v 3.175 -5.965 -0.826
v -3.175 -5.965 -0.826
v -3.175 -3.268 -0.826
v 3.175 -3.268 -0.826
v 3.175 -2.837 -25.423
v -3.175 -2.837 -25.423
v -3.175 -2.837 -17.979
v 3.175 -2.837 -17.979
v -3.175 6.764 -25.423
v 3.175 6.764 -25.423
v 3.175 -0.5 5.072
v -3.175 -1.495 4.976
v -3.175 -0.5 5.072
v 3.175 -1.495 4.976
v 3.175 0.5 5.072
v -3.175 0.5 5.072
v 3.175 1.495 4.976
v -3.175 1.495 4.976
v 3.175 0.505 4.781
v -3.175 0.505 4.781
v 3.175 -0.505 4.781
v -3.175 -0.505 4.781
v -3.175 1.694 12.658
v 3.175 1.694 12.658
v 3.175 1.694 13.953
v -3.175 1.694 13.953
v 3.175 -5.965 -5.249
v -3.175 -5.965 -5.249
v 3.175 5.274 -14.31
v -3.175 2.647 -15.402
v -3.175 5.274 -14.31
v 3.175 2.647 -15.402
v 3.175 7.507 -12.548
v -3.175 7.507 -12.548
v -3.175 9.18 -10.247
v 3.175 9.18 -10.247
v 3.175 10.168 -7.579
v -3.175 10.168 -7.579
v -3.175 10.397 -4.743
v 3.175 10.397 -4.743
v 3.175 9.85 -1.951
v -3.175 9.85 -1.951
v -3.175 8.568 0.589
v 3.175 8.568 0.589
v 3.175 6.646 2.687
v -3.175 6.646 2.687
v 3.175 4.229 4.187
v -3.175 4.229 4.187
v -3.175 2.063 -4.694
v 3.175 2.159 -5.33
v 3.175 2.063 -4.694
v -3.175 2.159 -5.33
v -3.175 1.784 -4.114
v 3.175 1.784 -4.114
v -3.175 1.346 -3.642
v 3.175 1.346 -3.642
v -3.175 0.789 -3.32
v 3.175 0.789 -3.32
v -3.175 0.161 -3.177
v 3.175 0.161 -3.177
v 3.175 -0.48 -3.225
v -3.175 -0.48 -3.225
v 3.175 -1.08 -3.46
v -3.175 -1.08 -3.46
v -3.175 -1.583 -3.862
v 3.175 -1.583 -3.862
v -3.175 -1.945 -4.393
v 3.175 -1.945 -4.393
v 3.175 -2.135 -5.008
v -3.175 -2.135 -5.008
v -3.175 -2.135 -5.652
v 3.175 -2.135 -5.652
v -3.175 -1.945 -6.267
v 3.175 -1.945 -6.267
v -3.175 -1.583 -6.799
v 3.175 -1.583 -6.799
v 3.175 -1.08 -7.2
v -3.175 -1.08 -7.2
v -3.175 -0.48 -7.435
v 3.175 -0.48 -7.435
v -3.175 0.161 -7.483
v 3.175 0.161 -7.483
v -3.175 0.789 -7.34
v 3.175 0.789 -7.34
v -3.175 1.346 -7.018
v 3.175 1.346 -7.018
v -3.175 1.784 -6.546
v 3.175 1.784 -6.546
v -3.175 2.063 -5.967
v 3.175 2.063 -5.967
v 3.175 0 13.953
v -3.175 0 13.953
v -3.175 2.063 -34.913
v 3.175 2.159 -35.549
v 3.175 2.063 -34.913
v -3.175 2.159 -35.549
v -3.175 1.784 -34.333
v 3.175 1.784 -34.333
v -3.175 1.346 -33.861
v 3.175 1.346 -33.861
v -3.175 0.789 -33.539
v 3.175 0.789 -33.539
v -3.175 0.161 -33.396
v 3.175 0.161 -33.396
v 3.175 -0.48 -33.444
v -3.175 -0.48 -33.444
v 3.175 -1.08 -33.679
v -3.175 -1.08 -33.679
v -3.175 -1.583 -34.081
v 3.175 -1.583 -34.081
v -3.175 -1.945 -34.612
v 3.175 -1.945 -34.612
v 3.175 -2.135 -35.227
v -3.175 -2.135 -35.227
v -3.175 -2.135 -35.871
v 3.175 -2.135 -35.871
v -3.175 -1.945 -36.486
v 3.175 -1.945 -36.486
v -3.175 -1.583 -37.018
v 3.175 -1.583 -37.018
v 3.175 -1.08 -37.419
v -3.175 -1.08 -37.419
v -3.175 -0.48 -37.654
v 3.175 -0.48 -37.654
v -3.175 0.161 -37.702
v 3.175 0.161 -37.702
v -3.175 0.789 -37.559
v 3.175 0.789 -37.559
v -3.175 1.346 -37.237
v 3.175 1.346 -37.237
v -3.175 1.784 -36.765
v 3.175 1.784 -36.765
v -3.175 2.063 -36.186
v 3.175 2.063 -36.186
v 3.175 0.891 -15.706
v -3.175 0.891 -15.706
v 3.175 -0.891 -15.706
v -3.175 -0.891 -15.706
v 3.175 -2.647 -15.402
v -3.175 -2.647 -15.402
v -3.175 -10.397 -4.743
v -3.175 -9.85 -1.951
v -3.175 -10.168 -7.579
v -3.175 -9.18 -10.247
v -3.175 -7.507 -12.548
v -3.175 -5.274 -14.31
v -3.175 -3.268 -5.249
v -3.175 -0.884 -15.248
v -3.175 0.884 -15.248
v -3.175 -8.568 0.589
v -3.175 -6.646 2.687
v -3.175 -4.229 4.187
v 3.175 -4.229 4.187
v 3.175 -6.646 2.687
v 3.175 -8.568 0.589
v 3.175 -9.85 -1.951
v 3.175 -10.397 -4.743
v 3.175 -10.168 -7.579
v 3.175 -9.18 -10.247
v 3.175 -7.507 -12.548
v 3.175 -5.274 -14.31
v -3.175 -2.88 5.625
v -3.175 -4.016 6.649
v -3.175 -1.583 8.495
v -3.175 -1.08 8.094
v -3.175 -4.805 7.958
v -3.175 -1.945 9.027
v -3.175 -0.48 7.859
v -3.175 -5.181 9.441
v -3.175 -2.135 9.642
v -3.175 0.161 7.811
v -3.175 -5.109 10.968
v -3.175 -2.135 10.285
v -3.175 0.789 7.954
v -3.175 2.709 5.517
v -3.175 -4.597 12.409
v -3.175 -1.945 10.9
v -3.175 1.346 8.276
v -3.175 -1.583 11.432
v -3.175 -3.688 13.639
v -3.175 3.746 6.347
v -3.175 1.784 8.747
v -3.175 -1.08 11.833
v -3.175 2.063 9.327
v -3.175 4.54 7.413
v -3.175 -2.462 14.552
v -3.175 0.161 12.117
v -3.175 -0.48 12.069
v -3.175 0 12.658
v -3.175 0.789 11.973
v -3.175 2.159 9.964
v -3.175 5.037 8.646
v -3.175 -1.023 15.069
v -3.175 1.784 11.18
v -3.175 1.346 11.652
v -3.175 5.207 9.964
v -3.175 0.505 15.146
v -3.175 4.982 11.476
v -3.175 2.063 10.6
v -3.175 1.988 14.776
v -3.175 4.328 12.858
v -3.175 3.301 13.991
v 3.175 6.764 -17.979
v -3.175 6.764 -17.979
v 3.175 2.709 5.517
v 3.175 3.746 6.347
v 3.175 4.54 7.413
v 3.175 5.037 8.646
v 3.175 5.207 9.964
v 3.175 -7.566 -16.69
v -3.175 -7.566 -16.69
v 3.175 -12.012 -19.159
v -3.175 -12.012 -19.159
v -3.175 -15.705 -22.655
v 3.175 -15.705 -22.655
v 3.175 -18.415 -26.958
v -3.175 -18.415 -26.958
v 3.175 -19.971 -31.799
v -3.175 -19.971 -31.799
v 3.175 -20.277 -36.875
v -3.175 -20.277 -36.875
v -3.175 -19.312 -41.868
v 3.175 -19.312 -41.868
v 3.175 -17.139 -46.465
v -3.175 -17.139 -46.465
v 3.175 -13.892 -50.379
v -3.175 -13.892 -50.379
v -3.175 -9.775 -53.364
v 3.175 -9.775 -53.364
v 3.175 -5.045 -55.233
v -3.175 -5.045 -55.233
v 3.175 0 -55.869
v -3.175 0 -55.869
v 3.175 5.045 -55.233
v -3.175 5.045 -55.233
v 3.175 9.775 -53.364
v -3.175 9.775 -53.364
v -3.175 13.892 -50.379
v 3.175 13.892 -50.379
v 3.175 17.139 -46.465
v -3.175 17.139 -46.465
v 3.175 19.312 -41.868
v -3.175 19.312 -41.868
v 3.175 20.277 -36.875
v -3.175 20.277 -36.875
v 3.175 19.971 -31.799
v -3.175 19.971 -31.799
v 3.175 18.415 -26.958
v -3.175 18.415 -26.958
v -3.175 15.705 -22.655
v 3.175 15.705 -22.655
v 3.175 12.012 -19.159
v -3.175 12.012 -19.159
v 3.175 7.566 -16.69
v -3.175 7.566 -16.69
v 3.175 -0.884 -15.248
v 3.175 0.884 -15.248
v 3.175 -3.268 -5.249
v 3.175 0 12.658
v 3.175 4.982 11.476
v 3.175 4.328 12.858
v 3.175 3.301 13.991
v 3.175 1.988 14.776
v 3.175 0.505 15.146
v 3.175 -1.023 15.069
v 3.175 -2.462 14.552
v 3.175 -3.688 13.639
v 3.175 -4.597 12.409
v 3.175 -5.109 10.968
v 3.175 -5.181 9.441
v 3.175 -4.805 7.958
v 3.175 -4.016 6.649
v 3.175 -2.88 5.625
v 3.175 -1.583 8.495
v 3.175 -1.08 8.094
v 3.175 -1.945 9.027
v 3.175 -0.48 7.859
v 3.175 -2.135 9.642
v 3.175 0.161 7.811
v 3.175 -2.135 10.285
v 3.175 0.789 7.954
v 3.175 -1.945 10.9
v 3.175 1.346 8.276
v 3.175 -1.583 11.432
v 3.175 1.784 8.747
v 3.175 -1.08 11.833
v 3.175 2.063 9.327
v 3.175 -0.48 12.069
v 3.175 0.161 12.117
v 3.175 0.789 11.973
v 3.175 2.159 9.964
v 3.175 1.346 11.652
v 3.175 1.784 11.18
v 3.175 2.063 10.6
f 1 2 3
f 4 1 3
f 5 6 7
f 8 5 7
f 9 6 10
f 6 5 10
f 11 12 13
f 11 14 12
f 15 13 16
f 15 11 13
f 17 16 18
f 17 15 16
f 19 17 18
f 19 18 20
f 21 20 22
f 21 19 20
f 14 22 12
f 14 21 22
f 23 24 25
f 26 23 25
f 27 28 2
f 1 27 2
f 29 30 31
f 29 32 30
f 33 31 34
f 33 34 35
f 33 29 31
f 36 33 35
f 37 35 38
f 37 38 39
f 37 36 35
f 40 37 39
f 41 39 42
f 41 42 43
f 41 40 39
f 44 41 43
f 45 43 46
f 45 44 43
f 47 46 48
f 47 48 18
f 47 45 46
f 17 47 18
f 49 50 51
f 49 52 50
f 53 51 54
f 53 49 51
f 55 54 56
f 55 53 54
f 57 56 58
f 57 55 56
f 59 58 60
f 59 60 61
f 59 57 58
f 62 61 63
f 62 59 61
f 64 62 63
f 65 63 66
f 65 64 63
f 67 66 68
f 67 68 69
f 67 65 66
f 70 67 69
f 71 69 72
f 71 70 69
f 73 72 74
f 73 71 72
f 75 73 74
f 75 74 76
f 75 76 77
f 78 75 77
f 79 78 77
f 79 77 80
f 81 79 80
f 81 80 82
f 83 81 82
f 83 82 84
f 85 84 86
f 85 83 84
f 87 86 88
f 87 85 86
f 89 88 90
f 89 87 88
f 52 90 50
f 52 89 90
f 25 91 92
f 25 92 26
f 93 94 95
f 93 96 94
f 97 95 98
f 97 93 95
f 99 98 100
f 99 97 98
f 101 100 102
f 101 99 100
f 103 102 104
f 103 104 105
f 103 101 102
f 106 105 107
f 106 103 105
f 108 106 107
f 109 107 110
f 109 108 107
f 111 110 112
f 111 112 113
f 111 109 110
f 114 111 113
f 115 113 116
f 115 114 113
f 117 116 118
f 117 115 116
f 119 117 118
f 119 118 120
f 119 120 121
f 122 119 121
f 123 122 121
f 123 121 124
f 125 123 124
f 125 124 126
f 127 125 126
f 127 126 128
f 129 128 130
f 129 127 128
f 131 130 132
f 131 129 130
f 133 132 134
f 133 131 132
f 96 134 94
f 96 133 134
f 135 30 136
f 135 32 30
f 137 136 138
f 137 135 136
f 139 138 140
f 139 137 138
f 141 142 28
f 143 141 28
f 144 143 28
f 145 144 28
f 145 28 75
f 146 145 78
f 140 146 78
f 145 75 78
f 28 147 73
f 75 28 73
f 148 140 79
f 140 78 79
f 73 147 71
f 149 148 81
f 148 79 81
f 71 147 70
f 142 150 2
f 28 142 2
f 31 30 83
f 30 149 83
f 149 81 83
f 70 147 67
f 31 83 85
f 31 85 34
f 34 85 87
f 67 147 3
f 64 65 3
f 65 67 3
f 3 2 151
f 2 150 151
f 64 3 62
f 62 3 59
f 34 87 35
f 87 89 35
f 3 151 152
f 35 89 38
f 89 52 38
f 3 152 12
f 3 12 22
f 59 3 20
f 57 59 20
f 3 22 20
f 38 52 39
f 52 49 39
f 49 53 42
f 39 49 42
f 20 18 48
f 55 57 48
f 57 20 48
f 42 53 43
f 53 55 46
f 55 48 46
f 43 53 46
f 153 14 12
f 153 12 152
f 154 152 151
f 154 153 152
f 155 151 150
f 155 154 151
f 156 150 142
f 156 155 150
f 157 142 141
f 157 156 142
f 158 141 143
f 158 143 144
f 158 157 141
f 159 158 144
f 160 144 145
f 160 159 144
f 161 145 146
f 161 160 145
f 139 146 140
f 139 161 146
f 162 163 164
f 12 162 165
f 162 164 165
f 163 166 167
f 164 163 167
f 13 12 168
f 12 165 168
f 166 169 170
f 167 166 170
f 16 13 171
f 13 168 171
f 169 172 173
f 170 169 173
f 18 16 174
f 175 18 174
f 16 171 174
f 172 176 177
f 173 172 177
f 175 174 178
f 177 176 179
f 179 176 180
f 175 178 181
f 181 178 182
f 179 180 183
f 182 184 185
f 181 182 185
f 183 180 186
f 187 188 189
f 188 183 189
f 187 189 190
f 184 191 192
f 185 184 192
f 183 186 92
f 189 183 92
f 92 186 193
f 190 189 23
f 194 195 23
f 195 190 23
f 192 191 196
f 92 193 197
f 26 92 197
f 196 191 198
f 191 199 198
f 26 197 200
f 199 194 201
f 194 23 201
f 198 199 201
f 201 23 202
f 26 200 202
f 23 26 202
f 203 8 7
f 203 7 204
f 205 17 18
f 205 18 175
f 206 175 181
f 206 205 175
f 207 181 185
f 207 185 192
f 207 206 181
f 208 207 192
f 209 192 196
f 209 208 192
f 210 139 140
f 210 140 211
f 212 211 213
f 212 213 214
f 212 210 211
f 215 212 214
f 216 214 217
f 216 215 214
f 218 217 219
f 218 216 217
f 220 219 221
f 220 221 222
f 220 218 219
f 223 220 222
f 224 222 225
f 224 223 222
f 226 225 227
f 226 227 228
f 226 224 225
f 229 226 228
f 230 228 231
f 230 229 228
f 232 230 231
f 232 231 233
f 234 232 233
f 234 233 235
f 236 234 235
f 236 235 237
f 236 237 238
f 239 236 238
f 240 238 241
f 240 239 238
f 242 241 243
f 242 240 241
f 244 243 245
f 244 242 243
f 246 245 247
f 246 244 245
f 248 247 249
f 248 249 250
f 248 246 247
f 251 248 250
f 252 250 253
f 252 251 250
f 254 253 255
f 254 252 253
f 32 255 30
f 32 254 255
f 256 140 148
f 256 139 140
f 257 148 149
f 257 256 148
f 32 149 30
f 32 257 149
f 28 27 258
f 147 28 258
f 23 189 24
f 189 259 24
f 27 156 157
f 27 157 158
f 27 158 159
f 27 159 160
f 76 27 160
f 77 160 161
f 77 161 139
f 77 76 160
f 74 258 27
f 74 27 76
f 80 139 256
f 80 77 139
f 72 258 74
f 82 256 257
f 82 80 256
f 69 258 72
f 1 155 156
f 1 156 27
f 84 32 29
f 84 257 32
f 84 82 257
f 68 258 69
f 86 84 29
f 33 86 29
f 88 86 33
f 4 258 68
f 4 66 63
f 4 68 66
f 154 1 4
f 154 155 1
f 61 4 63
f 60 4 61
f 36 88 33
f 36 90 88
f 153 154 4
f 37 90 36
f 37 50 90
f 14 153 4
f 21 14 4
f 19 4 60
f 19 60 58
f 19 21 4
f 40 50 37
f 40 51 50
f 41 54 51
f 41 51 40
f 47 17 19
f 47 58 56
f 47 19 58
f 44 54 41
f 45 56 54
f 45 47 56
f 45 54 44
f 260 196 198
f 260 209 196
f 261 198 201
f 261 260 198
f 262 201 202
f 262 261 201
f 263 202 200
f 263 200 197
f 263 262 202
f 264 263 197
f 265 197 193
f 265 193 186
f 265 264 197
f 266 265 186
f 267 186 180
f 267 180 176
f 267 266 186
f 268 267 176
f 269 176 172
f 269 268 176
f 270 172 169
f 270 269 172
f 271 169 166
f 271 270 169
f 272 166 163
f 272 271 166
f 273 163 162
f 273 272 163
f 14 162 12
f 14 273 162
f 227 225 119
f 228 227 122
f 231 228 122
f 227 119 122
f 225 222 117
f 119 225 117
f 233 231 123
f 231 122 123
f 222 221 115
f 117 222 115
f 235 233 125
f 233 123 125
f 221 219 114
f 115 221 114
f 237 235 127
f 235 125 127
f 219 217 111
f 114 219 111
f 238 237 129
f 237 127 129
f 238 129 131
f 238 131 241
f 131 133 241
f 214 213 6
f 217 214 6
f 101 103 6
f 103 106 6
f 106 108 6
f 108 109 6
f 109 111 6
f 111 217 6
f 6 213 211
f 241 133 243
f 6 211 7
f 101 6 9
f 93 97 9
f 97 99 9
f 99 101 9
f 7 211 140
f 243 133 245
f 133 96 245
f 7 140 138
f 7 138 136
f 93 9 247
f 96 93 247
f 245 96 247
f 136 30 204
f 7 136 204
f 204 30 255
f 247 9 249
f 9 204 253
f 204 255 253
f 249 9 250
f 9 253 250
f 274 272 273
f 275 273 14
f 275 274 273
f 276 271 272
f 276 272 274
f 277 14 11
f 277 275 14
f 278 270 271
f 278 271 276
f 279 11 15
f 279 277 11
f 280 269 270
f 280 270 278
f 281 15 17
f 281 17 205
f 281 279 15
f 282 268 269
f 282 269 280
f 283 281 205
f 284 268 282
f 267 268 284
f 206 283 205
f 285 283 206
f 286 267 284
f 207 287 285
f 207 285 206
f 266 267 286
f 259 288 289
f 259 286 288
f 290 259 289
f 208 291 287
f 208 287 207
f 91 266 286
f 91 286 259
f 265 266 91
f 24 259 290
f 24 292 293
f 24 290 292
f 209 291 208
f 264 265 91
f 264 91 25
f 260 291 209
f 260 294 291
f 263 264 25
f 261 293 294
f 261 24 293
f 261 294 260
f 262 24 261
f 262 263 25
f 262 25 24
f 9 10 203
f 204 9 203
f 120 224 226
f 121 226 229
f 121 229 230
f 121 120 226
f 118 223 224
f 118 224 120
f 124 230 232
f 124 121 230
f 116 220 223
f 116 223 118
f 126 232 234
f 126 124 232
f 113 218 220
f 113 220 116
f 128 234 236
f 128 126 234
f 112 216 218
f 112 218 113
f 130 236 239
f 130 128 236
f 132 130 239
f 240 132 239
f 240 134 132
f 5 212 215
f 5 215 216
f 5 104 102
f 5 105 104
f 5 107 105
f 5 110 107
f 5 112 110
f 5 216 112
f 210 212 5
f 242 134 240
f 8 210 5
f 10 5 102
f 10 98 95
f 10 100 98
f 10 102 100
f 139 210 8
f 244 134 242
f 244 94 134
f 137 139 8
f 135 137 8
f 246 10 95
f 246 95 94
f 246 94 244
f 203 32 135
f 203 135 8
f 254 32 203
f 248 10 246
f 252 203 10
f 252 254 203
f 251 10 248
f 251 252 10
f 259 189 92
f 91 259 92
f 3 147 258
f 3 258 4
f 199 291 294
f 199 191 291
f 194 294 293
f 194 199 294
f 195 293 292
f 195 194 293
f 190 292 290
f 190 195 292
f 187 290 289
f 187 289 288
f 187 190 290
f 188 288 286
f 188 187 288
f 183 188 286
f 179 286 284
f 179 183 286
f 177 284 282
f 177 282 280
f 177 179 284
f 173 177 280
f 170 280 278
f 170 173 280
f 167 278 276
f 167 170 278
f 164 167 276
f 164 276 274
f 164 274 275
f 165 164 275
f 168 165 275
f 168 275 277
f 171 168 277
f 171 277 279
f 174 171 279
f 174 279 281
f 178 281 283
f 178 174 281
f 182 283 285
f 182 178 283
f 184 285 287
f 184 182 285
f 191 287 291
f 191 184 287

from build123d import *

# Parameters (mm, degrees)
F0_R     = 2.159
F0_W     = 1.6939451452
F0_H     = 1.2945365161
F1_DEPTH = 3.175
F0_W_2   = 2.6969534811
F0_H_2   = 4.4230010826
F0_W_3   = 9.6011492424
F0_H_3   = 7.443588227


with BuildPart() as f1:
    # F0 (on Right) → F1 (new body, symmetric)
    with BuildSketch(Plane.YZ):
        with BuildLine():
            ThreePointArc((-1.4952248906, 4.9759547406), (0, 5.0838546767), (1.4952248906, 4.9759547406))
            ThreePointArc((1.4952248906, 4.9759547406), (4.177229046, 6.8550205791), (5.207, 9.9636547643))
            ThreePointArc((5.207, 9.9636547643), (-3.1086341852, 14.1408838103), (-1.4952248906, 4.9759547406))
        make_face()
        with Locations((0, 9.9636547643)):
            Circle(F0_R, mode=Mode.SUBTRACT)
        with Locations((0.8469725726, 13.3056268096)):
            Rectangle(F0_W, F0_H, mode=Mode.SUBTRACT)
    extrude(amount=F1_DEPTH, both=True)


with BuildPart() as f1b:
    # F0 (on Right) → F1, piece 2 (new body, symmetric)
    with BuildSketch(Plane.YZ):
        with BuildLine():
            ThreePointArc((2.6465530474, -15.4022430674), (8.2465932189, -11.6897912475), (10.414, -5.3301453233))
            ThreePointArc((10.414, -5.3301453233), (7.8747275512, 1.4845492403), (1.4952248906, 4.9759547406))
            ThreePointArc((1.4952248906, 4.9759547406), (0, 4.7566547643), (-1.4952248906, 4.9759547406))
            ThreePointArc((-1.4952248906, 4.9759547406), (-10.3974187949, -4.7427115801), (-2.6465530474, -15.4022430674))
            ThreePointArc((-2.6465530474, -15.4022430674), (0, -15.2291573961), (2.6465530474, -15.4022430674))
        make_face()
        with Locations((-4.6169223497, -3.0379028758)):
            Rectangle(F0_W_2, F0_H_2, mode=Mode.SUBTRACT)
        with Locations((0, -5.3301453233)):
            Circle(F0_R, mode=Mode.SUBTRACT)
    extrude(amount=F1_DEPTH, both=True)


with BuildPart() as f1c:
    # F0 (on Right) → F1, piece 3 (new body, symmetric)
    with BuildSketch(Plane.YZ):
        with BuildLine():
            ThreePointArc((20.32, -35.5491573961), (15.2754763907, -22.1490745218), (2.6465530474, -15.4022430674))
            ThreePointArc((2.6465530474, -15.4022430674), (0, -15.7441453233), (-2.6465530474, -15.4022430674))
            ThreePointArc((-2.6465530474, -15.4022430674), (-13.4000828743, -50.8246337867), (20.32, -35.5491573961))
        make_face()
        with Locations((0, -35.5491573961)):
            Circle(F0_R, mode=Mode.SUBTRACT)
        with Locations((1.9636412617, -21.7008125037)):
            Rectangle(F0_W_3, F0_H_3, mode=Mode.SUBTRACT)
    extrude(amount=F1_DEPTH, both=True)


solid = Compound([f1.part, f1b.part, f1c.part])
